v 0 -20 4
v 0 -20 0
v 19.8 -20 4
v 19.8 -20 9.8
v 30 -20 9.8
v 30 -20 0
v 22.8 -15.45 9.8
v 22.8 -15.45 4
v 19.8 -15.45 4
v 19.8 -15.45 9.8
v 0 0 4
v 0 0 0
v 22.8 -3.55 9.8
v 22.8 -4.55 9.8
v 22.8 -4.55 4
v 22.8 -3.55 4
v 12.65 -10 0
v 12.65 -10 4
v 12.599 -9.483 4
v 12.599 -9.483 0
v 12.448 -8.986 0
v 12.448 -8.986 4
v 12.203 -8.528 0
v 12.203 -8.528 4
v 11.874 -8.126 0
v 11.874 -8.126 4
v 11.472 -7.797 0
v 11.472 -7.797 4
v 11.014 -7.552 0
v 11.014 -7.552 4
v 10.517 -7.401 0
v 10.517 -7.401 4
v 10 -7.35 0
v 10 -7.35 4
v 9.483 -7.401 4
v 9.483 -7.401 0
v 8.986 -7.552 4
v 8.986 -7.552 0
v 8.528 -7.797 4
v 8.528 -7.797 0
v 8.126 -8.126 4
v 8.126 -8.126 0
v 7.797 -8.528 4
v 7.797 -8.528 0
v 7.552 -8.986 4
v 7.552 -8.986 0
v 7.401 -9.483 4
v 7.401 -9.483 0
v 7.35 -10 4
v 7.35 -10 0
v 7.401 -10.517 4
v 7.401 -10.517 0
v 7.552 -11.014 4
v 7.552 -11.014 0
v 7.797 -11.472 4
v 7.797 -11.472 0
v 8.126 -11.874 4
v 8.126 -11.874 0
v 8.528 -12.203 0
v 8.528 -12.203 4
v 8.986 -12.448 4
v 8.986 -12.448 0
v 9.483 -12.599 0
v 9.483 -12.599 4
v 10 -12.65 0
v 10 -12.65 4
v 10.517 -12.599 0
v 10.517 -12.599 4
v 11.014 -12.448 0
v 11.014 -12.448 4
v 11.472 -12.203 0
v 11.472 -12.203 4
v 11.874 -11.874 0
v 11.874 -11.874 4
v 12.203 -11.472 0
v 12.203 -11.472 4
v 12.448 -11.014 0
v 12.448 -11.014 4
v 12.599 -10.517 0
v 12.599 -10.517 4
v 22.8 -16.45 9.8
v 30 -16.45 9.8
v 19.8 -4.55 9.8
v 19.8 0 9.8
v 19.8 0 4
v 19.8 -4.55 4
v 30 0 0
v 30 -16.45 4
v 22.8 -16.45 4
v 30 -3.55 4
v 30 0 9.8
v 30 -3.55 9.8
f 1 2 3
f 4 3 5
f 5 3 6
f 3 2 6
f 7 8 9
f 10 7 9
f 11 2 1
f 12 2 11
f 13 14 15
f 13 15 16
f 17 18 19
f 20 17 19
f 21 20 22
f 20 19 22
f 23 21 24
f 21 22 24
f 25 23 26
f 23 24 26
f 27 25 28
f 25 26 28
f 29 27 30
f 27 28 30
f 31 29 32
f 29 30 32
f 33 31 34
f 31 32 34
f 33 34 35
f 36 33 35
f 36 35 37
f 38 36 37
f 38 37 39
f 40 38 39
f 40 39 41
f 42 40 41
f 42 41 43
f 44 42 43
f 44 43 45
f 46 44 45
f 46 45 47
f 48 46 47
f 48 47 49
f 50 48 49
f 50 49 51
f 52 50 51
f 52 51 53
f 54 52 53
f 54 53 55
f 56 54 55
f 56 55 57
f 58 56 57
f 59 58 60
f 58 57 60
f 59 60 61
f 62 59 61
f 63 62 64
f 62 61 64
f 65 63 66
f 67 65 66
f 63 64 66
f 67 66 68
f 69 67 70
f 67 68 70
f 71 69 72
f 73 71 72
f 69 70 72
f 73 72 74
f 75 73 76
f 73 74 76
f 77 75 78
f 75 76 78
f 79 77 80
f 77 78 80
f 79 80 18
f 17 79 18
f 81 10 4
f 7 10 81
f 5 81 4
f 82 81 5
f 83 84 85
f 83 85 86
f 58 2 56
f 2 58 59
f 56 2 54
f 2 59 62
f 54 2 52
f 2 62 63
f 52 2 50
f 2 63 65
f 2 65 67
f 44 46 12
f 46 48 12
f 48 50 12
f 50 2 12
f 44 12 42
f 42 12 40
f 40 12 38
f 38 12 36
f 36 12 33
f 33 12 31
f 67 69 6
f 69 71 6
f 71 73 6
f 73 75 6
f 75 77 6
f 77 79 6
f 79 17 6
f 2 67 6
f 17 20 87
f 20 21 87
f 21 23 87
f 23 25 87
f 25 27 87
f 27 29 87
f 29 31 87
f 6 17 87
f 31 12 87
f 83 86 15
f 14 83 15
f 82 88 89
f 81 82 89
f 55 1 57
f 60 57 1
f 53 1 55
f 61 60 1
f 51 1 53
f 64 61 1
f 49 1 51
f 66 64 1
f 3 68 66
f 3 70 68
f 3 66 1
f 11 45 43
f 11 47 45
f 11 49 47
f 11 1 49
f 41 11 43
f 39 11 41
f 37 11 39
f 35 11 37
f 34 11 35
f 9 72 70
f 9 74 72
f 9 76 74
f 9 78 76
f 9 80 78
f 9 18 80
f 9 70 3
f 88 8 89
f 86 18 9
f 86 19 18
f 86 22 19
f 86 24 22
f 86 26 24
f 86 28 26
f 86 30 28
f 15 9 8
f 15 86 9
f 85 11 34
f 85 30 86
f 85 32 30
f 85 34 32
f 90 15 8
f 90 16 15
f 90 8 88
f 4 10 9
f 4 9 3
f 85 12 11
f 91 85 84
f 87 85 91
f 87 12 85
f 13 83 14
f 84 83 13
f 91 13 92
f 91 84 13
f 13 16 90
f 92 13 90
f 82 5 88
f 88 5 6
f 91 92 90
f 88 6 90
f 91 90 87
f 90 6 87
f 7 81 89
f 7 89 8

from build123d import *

# Parameters (mm, degrees)
SKETCH1_W           = 30
SKETCH1_H           = 20
BOSS_EXTRUDE1_DEPTH = 4
SKETCH2_R           = 2.65
CUT_EXTRUDE1_DEPTH  = 37.276714294
BOSS_EXTRUDE2_DEPTH = 5.8


with BuildPart() as part:
    # Sketch1 → Boss-Extrude1 (new body)
    with BuildSketch(Plane.XY):
        with Locations((15, -10)):
            Rectangle(SKETCH1_W, SKETCH1_H)
    extrude(amount=BOSS_EXTRUDE1_DEPTH)

    # Sketch2 → Cut-Extrude1 (cut, through all)
    with BuildSketch(Plane.XY.offset(4)):
        with Locations((10, -10)):
            Circle(SKETCH2_R)
    extrude(amount=-CUT_EXTRUDE1_DEPTH, mode=Mode.SUBTRACT)

    # Sketch3 → Boss-Extrude2 (add)
    with BuildSketch(Plane.XY.offset(4)):
        Polygon((22.8, -4.55), (22.8, -3.55), (22.8, 0), (19.8, 0), (19.8, -4.55), align=None)
        Polygon((22.8, 0), (22.8, -3.55), (29, -3.55), (30, -3.55), (30, 0), align=None)
        Polygon((22.8, -16.45), (22.8, -15.45), (19.8, -15.45), (19.8, -20), (22.8, -20), align=None)
        Polygon((30, -16.45), (29, -16.45), (22.8, -16.45), (22.8, -20), (30, -20), align=None)
    extrude(amount=BOSS_EXTRUDE2_DEPTH)


solid = part.part
